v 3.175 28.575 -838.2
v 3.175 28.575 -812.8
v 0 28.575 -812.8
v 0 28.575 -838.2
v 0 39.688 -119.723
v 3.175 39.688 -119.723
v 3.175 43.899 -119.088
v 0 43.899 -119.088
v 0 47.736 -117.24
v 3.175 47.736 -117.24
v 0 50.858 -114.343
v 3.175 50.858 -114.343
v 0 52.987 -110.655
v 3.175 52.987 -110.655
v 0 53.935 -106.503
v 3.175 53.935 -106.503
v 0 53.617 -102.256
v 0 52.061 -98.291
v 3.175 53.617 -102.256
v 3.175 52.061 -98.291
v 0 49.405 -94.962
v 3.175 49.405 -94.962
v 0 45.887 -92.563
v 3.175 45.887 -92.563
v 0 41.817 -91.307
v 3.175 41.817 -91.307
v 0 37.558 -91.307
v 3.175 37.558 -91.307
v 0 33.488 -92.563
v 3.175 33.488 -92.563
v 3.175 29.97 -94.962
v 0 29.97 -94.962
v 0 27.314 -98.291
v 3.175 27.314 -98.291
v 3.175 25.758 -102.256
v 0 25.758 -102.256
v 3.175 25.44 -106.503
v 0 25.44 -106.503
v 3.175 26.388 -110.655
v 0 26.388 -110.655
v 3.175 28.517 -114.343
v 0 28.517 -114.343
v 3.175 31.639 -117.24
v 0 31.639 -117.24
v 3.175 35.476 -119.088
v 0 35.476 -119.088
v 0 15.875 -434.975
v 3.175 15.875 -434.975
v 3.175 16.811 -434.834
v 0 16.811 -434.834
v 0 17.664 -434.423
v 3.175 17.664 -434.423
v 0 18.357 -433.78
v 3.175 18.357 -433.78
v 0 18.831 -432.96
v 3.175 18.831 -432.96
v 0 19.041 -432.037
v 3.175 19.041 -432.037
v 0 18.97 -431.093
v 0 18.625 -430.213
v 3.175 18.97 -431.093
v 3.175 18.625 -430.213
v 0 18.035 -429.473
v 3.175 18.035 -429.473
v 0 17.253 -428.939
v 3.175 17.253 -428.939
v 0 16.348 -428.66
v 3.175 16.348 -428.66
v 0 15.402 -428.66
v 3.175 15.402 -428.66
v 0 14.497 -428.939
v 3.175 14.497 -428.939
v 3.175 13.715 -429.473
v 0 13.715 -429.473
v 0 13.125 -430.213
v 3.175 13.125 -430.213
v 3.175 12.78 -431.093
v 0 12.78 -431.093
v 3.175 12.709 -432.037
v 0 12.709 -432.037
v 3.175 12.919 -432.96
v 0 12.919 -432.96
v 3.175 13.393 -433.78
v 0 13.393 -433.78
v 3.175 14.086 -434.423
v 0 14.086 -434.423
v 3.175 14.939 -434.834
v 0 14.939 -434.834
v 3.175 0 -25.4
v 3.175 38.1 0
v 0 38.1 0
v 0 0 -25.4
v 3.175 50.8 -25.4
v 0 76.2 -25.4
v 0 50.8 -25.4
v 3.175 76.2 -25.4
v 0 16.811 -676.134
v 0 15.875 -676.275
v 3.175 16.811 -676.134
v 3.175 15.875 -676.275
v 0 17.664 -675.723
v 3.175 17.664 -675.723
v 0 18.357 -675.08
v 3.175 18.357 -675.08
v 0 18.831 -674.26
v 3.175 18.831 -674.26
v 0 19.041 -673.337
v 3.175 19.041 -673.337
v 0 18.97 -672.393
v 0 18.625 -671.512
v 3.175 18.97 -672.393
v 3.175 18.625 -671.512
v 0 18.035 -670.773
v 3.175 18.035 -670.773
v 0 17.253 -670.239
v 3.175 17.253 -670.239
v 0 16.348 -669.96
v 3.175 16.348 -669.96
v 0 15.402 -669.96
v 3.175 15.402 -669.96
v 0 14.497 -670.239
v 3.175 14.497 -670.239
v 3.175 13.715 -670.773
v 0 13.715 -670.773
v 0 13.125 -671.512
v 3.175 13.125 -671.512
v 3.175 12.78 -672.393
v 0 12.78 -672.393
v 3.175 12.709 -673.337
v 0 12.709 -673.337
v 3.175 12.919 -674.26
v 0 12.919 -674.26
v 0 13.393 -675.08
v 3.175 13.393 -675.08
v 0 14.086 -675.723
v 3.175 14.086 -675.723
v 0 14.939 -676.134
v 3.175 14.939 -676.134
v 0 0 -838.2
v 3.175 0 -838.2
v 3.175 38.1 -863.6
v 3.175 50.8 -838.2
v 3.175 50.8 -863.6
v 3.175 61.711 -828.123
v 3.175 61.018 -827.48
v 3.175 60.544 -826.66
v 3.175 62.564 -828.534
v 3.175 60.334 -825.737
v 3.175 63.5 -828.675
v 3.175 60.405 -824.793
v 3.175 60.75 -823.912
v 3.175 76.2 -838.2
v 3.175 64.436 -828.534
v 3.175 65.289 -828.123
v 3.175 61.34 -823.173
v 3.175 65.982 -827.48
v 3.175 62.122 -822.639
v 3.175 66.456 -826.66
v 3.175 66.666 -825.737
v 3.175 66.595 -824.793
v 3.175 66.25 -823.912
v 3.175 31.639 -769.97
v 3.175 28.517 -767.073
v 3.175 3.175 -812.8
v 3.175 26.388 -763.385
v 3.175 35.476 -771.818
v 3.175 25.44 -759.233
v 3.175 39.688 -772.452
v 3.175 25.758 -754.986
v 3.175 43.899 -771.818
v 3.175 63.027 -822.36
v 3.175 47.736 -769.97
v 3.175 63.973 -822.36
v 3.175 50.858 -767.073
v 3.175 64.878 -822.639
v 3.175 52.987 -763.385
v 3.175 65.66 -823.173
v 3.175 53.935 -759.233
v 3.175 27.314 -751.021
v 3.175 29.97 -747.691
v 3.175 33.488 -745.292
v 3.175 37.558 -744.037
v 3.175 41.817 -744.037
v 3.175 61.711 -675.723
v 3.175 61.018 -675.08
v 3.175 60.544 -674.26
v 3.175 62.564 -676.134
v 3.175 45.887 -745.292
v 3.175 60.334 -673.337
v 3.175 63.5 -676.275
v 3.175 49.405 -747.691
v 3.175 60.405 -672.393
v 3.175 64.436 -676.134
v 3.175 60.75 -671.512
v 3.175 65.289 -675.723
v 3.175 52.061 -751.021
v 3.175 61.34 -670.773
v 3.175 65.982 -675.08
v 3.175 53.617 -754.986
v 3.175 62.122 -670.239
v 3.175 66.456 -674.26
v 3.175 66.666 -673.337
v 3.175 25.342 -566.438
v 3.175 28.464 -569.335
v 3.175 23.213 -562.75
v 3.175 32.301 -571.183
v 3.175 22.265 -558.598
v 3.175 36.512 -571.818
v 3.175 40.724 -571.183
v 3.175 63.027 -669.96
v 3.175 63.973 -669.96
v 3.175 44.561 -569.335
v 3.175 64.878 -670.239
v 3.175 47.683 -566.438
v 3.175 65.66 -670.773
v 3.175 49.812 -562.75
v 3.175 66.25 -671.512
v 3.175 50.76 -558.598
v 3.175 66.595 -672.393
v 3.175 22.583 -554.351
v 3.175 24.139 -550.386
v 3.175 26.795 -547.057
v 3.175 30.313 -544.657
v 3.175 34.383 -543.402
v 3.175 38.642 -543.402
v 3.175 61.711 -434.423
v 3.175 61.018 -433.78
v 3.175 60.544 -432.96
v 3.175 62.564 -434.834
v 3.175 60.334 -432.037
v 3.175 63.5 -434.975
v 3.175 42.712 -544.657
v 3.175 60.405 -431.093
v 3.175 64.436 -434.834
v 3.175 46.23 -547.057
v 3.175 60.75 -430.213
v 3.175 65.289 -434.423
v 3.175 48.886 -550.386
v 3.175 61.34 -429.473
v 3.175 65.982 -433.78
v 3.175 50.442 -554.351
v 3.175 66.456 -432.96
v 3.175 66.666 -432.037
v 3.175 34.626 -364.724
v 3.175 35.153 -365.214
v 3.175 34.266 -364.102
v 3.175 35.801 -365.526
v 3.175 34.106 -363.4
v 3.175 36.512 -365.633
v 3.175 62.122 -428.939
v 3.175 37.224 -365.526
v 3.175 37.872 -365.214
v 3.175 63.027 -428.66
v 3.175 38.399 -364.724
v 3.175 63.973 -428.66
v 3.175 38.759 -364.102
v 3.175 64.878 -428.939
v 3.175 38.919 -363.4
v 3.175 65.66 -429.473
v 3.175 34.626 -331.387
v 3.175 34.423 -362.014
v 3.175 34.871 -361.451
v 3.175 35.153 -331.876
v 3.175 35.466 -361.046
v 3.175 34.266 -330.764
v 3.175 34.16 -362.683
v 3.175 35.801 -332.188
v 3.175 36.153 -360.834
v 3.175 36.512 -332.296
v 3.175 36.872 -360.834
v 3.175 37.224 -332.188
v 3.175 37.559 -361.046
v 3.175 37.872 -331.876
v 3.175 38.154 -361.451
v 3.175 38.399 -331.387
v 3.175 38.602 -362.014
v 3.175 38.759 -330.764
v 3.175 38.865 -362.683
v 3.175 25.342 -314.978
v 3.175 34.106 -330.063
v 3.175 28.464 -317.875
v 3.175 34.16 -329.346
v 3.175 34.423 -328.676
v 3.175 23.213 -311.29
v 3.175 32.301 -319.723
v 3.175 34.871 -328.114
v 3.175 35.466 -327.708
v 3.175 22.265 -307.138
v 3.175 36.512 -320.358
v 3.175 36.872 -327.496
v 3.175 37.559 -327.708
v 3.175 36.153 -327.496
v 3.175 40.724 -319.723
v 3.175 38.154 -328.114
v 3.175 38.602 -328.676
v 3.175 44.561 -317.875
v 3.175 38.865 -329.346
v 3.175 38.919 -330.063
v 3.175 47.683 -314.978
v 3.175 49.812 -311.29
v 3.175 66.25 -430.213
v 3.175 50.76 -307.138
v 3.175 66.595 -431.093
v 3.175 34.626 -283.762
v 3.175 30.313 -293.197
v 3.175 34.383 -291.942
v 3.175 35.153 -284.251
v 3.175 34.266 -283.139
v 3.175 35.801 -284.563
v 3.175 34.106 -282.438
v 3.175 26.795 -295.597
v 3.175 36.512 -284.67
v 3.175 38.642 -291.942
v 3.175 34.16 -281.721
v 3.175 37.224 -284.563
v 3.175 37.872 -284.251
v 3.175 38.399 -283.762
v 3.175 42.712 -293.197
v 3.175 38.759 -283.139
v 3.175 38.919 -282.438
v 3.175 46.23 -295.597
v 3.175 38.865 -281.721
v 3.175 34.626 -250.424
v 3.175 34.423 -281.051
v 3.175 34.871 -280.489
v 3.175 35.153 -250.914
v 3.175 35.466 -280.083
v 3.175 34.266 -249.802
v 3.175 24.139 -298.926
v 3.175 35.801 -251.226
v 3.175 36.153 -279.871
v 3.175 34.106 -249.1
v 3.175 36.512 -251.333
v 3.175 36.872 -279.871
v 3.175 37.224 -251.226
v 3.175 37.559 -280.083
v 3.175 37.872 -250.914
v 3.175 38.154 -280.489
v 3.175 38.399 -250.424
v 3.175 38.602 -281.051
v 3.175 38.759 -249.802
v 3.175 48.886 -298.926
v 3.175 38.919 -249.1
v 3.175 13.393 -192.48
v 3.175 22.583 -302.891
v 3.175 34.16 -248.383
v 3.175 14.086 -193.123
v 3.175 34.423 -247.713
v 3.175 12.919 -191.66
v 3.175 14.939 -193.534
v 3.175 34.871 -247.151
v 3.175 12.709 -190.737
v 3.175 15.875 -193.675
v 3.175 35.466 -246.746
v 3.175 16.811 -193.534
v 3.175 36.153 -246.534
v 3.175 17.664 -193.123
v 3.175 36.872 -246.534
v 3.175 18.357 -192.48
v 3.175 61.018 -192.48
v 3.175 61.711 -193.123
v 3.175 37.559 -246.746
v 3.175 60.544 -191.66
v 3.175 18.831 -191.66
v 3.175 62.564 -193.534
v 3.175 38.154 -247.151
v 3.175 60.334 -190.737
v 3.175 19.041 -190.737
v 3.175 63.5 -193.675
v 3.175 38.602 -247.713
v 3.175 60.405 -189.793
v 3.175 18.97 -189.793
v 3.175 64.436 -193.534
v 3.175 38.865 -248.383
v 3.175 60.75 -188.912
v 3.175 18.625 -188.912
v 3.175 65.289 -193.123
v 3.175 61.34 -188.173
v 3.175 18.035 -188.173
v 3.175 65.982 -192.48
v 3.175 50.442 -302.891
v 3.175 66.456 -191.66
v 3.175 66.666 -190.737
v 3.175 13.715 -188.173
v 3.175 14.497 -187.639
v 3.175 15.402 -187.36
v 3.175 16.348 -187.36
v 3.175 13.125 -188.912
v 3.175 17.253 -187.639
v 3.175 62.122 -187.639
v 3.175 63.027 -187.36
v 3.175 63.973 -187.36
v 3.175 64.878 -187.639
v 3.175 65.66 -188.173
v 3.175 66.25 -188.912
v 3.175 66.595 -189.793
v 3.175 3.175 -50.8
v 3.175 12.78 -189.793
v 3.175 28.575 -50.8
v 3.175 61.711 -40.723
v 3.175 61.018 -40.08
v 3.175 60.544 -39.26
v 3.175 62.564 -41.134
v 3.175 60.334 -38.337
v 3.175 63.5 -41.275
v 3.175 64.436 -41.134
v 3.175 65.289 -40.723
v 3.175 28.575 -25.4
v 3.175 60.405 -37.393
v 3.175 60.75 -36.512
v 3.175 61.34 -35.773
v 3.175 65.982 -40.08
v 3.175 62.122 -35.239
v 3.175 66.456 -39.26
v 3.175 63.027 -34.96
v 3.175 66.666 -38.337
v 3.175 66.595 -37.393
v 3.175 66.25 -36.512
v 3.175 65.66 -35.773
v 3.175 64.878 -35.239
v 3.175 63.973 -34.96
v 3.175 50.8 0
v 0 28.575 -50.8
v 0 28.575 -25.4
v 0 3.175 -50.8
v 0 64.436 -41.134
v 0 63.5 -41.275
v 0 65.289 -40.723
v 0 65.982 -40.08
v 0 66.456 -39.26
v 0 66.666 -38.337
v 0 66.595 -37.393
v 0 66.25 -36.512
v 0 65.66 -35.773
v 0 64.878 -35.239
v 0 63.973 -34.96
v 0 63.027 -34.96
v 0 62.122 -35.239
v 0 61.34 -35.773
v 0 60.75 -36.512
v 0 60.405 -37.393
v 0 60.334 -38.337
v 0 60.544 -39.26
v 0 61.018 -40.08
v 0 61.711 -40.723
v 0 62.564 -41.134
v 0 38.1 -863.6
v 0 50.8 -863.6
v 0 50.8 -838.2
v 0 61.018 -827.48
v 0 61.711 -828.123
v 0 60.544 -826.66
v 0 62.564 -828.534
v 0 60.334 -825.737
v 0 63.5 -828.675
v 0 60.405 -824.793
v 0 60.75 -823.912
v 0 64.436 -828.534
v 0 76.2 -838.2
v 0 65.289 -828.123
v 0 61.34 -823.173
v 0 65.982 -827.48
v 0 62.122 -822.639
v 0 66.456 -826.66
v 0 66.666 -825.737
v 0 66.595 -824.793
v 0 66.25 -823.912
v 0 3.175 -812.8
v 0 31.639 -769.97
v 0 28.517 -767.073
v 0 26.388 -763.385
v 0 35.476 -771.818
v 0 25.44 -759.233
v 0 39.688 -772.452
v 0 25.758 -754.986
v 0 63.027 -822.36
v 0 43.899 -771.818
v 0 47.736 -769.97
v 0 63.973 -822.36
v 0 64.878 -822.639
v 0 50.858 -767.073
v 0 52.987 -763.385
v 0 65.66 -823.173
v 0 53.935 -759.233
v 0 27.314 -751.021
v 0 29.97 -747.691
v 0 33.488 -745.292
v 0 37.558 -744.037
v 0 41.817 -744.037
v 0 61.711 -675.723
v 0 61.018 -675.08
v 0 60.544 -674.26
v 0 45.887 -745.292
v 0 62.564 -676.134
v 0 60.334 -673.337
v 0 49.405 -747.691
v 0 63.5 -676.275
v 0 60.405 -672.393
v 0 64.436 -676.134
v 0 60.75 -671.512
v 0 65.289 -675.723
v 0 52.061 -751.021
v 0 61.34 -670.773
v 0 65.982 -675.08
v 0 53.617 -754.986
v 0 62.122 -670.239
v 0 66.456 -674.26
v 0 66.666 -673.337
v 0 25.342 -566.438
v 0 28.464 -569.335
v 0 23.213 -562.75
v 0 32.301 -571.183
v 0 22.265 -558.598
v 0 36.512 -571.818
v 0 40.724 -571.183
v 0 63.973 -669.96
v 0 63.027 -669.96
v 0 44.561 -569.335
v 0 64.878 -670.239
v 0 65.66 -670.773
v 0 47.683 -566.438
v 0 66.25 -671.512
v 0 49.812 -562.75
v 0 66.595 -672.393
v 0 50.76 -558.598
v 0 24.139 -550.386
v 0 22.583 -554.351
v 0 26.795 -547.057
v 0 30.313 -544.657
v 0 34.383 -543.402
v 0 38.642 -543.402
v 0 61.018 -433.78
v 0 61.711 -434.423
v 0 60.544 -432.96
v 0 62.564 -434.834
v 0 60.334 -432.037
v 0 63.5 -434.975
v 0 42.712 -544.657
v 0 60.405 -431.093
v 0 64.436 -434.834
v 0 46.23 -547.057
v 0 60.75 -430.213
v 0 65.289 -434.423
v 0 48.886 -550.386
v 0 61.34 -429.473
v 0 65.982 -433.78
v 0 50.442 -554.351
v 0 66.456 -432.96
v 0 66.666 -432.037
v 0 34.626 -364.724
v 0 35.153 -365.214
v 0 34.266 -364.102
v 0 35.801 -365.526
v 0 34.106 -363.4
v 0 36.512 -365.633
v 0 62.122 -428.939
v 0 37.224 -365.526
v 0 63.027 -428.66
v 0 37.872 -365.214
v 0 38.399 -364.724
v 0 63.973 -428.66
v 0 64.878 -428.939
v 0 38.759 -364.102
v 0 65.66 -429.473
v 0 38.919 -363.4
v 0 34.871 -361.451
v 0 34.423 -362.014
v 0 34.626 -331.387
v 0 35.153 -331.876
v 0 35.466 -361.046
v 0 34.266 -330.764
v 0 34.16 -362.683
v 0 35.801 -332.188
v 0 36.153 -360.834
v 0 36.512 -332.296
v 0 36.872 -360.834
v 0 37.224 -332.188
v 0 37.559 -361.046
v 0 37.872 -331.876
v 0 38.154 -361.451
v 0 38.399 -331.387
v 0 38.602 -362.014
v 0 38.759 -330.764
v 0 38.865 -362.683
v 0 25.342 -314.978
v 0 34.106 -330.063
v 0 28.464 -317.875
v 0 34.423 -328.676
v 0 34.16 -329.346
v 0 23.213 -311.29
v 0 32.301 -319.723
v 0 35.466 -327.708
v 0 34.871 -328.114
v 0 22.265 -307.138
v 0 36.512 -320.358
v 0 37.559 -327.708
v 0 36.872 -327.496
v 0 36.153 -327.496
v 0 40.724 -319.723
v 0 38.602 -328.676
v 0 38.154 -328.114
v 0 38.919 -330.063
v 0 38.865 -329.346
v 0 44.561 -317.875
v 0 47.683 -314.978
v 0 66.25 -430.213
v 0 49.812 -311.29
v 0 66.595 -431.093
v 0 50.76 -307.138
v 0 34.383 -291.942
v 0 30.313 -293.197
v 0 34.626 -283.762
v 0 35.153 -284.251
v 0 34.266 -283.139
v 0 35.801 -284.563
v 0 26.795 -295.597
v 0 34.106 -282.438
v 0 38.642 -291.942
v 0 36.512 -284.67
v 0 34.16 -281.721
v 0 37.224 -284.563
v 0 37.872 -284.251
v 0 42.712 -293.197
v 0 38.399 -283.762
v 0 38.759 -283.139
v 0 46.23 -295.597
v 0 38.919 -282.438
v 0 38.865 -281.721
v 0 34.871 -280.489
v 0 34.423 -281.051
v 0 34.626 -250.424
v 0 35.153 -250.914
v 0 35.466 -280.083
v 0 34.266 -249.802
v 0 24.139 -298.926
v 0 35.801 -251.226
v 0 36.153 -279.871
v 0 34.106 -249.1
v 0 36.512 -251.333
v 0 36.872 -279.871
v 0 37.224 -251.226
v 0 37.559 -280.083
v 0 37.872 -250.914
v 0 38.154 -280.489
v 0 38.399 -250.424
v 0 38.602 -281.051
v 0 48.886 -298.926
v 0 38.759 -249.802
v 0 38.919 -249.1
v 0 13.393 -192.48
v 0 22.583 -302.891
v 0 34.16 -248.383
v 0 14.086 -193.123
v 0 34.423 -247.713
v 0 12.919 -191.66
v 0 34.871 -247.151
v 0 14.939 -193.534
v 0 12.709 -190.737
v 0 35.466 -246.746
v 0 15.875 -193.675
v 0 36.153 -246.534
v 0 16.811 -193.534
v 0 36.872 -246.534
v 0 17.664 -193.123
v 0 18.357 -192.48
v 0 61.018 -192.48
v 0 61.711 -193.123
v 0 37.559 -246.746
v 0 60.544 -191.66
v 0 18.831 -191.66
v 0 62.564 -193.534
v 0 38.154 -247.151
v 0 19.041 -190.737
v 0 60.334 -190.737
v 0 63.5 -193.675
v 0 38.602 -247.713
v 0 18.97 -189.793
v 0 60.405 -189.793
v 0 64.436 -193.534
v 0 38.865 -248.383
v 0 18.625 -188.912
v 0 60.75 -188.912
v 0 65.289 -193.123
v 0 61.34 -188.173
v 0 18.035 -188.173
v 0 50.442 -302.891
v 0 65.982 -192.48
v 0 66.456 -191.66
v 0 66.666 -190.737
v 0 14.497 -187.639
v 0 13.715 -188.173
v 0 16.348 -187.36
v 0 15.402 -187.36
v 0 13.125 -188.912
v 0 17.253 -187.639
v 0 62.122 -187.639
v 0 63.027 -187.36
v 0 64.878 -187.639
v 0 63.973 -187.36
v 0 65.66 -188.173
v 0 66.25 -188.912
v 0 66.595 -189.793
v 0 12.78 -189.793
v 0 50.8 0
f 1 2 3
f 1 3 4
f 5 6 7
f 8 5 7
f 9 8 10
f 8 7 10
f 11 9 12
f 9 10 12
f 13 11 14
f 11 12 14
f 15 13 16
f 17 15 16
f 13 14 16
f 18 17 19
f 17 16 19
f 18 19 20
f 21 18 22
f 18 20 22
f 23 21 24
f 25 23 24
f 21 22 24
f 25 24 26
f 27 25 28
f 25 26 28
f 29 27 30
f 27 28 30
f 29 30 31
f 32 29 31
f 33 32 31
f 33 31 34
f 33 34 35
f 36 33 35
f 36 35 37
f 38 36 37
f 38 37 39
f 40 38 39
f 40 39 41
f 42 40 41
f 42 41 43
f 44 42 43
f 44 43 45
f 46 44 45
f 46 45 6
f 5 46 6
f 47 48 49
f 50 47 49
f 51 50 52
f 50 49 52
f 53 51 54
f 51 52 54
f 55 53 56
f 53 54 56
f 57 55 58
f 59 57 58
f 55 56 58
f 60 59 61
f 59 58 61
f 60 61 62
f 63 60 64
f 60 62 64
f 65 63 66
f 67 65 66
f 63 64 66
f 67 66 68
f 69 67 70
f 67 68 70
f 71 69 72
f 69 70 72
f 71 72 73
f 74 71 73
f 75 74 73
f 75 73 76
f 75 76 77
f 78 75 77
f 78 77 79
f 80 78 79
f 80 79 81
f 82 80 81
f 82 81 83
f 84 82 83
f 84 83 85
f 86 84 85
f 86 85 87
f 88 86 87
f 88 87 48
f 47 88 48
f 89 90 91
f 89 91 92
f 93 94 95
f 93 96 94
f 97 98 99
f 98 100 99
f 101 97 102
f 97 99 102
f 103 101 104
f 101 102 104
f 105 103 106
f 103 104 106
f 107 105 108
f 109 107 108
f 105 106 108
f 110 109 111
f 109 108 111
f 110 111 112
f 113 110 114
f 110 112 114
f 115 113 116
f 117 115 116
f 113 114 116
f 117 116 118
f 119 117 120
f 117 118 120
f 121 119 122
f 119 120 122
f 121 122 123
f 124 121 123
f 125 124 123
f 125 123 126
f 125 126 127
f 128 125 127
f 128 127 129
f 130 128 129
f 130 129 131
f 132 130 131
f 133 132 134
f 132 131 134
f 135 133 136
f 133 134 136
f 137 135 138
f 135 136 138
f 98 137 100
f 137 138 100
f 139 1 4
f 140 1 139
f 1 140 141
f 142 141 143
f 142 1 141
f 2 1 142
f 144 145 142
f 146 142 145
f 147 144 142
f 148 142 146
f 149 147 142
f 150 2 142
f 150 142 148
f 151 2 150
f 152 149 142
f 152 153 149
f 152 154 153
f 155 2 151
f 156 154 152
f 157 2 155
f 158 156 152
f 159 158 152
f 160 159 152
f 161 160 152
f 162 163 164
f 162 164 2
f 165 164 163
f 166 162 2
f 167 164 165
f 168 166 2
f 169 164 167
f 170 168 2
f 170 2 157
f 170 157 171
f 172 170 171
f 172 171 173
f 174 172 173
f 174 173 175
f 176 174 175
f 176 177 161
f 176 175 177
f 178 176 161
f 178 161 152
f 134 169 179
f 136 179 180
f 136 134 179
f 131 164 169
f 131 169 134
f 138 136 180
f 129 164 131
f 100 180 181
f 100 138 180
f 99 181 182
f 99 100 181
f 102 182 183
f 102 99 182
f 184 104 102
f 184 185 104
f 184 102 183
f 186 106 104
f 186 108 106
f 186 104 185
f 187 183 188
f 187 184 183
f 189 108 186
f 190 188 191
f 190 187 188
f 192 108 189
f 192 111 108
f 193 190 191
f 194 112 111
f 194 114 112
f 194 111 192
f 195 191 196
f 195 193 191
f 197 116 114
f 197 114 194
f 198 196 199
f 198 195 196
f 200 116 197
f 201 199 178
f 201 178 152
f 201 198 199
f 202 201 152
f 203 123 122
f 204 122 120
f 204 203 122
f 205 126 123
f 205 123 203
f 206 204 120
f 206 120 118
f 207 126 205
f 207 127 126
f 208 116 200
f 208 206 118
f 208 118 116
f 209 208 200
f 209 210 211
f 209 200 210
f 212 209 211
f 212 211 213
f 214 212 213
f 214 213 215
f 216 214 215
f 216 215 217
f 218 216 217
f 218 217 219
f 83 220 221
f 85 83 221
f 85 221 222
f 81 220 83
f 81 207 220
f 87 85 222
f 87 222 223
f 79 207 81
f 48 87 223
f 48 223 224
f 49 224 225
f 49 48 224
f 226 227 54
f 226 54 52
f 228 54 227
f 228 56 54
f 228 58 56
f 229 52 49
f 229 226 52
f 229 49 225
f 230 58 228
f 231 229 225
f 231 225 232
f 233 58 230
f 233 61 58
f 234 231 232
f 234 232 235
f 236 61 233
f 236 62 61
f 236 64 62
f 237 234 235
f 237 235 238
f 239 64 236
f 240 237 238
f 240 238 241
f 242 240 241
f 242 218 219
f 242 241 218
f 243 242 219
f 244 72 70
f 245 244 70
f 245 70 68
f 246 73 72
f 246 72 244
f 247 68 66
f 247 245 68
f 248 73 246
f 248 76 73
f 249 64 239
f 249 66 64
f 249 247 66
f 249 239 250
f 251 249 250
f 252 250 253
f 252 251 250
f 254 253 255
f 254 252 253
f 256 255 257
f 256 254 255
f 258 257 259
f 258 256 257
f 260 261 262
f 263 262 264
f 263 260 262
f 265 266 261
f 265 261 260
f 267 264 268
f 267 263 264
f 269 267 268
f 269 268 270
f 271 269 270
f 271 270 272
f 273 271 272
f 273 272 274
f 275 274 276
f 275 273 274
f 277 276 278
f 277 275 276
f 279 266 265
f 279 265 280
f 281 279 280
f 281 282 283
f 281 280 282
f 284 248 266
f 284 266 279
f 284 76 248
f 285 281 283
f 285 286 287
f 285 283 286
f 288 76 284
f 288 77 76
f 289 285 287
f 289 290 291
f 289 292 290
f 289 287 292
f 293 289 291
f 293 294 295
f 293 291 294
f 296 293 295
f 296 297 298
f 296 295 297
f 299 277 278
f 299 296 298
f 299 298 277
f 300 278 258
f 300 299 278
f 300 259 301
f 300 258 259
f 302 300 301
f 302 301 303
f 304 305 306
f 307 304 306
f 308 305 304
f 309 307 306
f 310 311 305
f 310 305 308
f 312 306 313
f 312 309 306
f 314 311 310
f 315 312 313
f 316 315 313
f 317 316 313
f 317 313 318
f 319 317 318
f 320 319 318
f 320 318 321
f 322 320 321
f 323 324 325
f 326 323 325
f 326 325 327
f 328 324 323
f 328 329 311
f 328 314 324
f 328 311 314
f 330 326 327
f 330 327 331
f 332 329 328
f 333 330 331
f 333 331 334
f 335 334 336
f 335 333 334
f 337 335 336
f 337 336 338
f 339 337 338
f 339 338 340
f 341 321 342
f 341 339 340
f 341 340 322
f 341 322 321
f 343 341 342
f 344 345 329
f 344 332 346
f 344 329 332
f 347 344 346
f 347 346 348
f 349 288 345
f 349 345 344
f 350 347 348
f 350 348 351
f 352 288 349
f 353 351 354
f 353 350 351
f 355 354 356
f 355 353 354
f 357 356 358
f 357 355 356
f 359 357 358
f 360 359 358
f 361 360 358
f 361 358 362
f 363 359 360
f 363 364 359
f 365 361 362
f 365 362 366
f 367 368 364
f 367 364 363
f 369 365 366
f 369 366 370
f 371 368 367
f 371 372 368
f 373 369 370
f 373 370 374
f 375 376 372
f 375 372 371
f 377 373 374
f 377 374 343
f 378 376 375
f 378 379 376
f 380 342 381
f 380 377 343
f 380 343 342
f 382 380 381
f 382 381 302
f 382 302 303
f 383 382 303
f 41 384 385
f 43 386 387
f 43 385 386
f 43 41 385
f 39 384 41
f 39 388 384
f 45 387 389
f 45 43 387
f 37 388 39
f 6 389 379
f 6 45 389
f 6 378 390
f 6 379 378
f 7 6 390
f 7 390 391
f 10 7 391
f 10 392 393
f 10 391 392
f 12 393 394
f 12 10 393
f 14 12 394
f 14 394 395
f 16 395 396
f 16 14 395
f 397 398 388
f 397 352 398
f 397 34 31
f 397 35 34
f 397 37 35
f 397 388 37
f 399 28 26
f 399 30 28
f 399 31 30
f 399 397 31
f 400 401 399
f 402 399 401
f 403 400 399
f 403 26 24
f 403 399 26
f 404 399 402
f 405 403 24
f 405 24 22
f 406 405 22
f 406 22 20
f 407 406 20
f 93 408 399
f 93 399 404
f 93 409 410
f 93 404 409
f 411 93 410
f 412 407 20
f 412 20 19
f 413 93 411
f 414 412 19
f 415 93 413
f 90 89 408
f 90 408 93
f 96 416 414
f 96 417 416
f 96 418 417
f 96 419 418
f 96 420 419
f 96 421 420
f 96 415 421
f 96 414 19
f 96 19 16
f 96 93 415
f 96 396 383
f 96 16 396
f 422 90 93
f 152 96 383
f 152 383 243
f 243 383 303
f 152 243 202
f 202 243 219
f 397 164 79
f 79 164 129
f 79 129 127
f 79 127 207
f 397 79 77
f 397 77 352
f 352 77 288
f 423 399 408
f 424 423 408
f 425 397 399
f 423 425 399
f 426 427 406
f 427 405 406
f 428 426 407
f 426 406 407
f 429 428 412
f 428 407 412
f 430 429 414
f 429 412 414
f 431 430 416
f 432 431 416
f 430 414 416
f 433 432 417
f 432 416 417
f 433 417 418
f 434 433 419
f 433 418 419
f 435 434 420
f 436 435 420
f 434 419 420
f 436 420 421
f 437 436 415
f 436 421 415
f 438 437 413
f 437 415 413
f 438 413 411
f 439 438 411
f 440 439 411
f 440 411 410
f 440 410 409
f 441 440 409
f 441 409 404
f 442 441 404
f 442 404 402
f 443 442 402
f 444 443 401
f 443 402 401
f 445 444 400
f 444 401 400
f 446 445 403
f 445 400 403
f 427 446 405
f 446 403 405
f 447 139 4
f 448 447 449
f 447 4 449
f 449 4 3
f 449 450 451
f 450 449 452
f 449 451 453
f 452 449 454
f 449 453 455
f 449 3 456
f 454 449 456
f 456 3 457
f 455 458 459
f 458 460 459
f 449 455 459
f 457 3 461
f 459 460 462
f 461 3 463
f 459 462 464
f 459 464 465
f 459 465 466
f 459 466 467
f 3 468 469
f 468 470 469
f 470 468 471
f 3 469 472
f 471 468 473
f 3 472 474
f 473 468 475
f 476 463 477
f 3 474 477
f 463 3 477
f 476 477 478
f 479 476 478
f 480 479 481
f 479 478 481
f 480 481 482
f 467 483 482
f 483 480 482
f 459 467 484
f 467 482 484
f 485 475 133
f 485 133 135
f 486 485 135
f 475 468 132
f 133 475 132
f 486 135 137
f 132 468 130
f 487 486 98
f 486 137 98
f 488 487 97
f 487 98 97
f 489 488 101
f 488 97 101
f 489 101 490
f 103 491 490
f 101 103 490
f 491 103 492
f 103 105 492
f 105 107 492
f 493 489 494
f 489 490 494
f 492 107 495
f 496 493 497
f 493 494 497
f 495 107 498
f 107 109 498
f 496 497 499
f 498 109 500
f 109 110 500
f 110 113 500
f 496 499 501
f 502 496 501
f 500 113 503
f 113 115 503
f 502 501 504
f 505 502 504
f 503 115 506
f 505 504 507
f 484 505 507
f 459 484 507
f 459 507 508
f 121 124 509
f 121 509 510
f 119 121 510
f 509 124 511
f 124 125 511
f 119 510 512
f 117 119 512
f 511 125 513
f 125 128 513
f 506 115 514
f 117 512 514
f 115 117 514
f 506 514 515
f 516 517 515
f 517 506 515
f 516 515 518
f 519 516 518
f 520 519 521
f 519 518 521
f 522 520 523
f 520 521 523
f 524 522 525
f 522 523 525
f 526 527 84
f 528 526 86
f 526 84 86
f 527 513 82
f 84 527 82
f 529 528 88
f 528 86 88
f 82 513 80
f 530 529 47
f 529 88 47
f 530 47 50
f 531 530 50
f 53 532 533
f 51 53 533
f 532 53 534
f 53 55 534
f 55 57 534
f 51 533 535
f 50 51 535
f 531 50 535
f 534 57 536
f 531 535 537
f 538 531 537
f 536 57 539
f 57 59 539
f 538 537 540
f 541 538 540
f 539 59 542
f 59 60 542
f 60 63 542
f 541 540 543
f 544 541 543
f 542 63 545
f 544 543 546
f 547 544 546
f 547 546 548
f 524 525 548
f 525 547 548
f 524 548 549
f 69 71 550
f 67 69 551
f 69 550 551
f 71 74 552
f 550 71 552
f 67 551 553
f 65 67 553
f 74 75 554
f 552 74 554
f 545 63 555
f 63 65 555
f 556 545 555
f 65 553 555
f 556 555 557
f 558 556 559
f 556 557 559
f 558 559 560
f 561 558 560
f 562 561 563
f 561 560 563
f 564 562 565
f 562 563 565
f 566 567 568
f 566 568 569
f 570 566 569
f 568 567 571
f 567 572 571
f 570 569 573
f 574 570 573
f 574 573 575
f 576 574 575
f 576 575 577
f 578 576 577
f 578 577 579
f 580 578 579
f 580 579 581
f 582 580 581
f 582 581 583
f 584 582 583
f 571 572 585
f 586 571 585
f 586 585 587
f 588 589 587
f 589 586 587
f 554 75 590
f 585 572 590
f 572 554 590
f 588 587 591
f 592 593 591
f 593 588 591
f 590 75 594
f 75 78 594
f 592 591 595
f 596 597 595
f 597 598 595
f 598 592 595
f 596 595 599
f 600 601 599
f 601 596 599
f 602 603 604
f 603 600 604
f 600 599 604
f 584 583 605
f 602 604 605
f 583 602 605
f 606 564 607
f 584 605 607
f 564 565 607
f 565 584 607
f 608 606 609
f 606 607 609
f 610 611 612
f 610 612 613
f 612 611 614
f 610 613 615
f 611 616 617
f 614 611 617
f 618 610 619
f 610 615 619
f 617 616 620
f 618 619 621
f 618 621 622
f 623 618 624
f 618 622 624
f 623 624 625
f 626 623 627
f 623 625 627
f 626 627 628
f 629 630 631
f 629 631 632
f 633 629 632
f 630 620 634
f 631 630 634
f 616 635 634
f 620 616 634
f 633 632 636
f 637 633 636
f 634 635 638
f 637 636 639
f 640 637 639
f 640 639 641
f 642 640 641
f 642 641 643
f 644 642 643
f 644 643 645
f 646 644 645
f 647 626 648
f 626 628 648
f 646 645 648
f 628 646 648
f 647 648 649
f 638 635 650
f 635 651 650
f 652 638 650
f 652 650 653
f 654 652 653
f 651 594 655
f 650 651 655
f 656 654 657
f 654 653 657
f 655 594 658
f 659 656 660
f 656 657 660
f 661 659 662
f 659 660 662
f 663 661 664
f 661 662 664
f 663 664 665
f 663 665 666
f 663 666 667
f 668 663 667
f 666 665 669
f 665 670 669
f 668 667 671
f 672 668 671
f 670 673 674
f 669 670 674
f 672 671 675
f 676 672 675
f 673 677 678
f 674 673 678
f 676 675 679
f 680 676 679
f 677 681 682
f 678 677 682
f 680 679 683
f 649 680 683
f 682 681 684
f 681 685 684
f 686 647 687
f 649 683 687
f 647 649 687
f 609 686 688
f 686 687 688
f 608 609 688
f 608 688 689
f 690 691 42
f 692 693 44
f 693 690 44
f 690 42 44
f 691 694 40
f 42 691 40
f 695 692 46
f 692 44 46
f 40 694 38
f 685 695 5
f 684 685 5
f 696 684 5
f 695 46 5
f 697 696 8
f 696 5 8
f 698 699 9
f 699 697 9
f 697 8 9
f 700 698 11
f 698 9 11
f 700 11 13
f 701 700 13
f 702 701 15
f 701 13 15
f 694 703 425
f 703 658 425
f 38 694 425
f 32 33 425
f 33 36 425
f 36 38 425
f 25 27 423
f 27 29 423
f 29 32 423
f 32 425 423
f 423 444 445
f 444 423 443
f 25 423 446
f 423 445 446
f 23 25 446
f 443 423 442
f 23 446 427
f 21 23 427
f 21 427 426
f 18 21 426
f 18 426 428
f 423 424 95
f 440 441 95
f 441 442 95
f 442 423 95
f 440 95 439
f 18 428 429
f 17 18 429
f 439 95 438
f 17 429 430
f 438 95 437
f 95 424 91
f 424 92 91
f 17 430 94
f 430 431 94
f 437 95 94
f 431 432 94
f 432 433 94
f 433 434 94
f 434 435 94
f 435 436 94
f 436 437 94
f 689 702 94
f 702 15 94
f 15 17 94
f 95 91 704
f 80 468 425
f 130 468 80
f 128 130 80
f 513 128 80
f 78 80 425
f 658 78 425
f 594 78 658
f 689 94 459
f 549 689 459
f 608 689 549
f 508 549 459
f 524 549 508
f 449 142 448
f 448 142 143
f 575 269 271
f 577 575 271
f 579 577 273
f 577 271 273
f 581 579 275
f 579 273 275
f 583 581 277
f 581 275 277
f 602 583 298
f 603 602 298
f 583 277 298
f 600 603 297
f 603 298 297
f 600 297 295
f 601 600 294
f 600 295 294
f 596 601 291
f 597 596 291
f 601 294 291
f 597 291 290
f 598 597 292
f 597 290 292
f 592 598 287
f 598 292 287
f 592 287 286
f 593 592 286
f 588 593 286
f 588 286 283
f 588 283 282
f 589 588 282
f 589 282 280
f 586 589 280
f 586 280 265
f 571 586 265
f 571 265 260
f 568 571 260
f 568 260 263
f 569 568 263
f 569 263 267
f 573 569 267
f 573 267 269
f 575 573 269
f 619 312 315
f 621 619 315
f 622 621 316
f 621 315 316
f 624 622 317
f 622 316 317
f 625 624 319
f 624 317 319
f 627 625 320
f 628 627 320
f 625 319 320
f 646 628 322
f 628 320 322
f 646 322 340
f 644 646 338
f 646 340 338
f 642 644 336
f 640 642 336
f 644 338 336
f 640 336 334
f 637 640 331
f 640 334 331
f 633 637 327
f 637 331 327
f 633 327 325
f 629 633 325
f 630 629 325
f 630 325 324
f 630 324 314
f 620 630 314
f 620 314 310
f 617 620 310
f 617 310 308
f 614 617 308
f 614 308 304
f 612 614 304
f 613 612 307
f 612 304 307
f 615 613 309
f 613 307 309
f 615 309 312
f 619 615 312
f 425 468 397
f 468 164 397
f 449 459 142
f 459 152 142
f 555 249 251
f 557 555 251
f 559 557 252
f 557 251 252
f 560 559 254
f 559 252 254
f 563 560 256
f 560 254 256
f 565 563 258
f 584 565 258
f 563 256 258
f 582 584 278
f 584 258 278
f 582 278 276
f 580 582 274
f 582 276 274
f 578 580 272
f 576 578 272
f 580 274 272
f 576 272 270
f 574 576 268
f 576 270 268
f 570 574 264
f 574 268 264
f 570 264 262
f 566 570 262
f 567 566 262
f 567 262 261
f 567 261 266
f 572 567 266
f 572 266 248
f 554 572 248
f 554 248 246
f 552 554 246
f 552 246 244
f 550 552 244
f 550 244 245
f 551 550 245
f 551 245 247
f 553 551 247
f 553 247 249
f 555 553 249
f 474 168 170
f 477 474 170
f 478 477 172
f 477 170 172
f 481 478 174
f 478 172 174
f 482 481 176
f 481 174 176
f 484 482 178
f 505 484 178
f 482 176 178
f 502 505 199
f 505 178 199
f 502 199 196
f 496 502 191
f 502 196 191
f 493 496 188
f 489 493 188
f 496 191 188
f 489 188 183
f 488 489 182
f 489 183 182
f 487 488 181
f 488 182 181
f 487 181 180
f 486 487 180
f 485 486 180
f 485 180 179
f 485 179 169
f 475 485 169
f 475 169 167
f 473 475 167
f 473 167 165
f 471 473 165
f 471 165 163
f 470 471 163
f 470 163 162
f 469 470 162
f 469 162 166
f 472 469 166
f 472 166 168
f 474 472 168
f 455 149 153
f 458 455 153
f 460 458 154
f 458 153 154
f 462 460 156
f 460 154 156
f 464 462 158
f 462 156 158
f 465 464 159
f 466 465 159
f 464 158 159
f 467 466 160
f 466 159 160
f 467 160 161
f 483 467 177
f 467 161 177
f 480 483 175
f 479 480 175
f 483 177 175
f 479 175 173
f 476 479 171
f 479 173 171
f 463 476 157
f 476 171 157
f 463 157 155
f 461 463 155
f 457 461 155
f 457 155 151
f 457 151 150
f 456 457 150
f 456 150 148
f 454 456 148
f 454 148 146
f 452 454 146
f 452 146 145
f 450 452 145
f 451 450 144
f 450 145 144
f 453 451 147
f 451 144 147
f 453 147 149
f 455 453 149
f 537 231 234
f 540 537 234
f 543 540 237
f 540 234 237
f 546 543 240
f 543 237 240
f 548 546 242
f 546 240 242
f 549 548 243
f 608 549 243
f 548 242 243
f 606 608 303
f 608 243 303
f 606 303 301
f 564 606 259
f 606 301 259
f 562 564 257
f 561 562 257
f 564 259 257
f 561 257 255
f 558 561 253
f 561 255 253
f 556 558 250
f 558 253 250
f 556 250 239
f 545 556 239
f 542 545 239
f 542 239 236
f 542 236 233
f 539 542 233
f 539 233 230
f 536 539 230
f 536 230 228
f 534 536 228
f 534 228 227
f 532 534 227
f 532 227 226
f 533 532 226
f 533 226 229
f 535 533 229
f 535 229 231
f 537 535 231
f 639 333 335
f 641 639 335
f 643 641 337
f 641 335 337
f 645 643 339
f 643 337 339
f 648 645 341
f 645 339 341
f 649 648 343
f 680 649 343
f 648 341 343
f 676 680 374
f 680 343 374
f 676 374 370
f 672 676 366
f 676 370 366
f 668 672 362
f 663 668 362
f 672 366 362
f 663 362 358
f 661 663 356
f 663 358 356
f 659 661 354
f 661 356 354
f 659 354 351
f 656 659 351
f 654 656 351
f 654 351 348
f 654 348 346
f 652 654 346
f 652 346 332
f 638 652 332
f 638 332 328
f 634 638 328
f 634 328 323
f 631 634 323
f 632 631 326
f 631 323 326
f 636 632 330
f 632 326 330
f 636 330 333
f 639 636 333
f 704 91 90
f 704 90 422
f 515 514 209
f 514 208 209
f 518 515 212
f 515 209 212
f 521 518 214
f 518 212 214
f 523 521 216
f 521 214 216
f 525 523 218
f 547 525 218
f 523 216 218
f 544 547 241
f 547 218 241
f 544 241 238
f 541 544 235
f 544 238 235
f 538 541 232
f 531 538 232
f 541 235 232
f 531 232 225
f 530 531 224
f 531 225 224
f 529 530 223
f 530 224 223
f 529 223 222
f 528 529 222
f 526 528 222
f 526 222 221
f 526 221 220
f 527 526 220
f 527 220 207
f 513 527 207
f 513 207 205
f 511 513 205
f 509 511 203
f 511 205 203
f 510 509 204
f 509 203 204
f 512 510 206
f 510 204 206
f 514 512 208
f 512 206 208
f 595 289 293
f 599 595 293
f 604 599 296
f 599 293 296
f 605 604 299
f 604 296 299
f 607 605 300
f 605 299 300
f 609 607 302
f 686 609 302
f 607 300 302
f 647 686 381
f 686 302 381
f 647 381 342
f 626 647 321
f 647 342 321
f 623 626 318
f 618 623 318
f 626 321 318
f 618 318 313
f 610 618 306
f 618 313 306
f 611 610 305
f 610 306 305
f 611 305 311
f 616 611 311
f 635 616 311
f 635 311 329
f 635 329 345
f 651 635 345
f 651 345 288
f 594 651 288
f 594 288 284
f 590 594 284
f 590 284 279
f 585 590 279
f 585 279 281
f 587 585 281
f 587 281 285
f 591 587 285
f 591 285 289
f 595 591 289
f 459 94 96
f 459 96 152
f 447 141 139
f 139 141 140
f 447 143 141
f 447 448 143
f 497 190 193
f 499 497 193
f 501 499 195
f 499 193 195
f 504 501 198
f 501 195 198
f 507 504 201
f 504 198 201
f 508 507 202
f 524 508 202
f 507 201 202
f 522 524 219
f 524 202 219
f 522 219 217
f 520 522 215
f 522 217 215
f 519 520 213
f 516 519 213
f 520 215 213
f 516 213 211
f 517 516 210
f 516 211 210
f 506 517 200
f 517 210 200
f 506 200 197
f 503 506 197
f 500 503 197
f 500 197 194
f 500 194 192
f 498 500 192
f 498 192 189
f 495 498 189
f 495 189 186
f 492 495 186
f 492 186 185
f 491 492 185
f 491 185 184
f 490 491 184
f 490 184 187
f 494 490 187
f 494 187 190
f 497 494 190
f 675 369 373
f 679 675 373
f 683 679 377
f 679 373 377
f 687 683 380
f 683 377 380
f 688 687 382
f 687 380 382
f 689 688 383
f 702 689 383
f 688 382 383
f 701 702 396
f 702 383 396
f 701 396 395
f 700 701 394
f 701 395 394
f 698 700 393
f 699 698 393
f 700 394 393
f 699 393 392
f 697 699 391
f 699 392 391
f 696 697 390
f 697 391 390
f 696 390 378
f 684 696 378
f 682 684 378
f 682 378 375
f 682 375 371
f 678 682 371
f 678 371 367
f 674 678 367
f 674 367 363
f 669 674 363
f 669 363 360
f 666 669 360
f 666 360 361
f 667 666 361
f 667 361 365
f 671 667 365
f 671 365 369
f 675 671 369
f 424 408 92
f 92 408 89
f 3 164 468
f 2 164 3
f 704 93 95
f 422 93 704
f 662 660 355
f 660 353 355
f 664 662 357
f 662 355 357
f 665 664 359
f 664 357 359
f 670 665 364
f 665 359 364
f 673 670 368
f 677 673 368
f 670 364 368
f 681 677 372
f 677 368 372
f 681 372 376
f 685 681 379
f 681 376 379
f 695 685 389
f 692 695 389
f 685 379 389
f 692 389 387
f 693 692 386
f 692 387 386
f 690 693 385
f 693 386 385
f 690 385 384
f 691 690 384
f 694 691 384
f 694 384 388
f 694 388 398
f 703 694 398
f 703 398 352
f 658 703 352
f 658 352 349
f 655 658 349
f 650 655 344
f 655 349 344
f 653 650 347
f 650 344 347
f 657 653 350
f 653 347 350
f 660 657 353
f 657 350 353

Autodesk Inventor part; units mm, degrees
ref_plane "YZ Plane" through (0, 0, 0) normal (1, 0, 0) x (0, 1, 0)
ref_plane "XZ Plane" through (0, 0, 0) normal (0, 1, 0) x (-1, 0, 0)
ref_plane "XY Plane" through (0, 0, 0) normal (0, 0, 1) x (1, 0, 0)
sketch "Sketch1" plane through (0, 0, 0) normal (1, 0, 0) x (0, 1, 0)
  line L0 (0, 0) -> (76.2, 0)
  line L1 (76.2, 0) -> (76.2, -863.6)
  line L2 (76.2, -863.6) -> (0, -863.6)
  line L3 (0, -863.6) -> (0, 0)
  dimension "d0" = 76.2
  dimension "d1" = 863.6
extrude "Extrusion1" add sketch "Sketch1" along normal blind 3.175
sketch "Sketch2" plane through (3.175, 0, 0) normal (1, 0, 0) x (0, 0, -1)
  line L0 (0, 38.1) -> (0, 36.5125)
  line L1 (0, 36.5125) -> (0, 39.6875)
  circle A0 centre (306.07, 36.5125) radius 14.2875
  circle A1 centre (557.53, 36.5125) radius 14.2875
  circle A2 centre (105.4351, 39.6875) radius 14.2875
  circle A3 centre (758.1649, 39.6875) radius 14.2875
  line L2 (863.6, 0) -> (838.2, 0)
  line L3 (863.6, 0) -> (863.6, 38.1)
  line L4 (863.6, 38.1) -> (838.2, 0)
  circle A4 centre (12.7, 63.5) radius 3.175
  line L5 (863.6, 76.2) -> (0, 76.2) projected
  circle A5 centre (850.9, 63.5) radius 3.175
  circle A6 centre (825.5, 15.875) radius 3.175
  circle A7 centre (38.1, 15.875) radius 3.175
  circle A8 centre (190.5, 15.875) radius 3.175
  circle A9 centre (431.8, 15.875) radius 3.175
  circle A10 centre (431.8, 63.5) radius 3.175
  circle A11 centre (673.1, 63.5) radius 3.175
  circle A12 centre (673.1, 15.875) radius 3.175
  circle A13 centre (190.5, 63.5) radius 3.175
  line L6 (0, 0) -> (25.4, 0)
  line L7 (0, 0) -> (0, 38.1)
  line L8 (0, 38.1) -> (25.4, 0)
  line L9 (863.6, 0) -> (0, 0) projected
  dimension "d15" = 28.575
  dimension "d16" = 28.575
  dimension "d19" = 28.575
  dimension "d21" = 28.575
  dimension "d22" = 25.4
  dimension "d26" = 6.35
  dimension "d27" = 12.7
  dimension "d29" = 6.35
  dimension "d30" = 12.7
  dimension "d32" = 6.35
  dimension "d34" = 12.7
  dimension "d35" = 6.35
  dimension "d39" = 6.35
  dimension "d40" = 863.6
  dimension "d41" = 6.35
  dimension "d43" = 6.35
  dimension "d44" = 12.7
  dimension "d45" = 6.35
  dimension "d46" = 6.35
  dimension "d48" = 241.3
  dimension "d49" = 241.3
  dimension "d50" = 6.35
  dimension "d51" = 241.3
  dimension "d53" = 241.3
  dimension "d54" = 25.4
  dimension "d55" = 38.1
  dimension "d58" = 15.875
  dimension "d59" = 15.875
  dimension "d60" = 15.875
extrude "Extrusion3" cut sketch "Sketch2" against normal blind 25.4
sketch "Sketch3" plane through (3.175, 0, 0) normal (1, 0, 0) x (0, 0, -1)
  line L0 (0, 76.2) -> (863.6, 76.2) projected
  line L1 (0, 76.2) -> (25.4, 76.2)
  line L2 (25.4, 76.2) -> (25.4, 50.8)
  line L3 (25.4, 50.8) -> (0, 50.8)
  line L4 (0, 50.8) -> (0, 76.2)
  line L5 (25.4, 0) -> (50.8, 0)
  line L6 (50.8, 0) -> (50.8, 28.575)
  line L7 (50.8, 28.575) -> (25.4, 28.575)
  line L8 (25.4, 28.575) -> (25.4, 0)
  line L9 (863.6, 76.2) -> (838.2, 76.2)
  line L10 (838.2, 76.2) -> (838.2, 50.8)
  line L11 (838.2, 50.8) -> (863.6, 50.8)
  line L12 (863.6, 50.8) -> (863.6, 76.2)
  line L13 (50.8, 0) -> (812.8, 0)
  line L14 (812.8, 0) -> (812.8, 3.175)
  line L15 (812.8, 3.175) -> (50.8, 3.175)
  line L16 (50.8, 3.175) -> (50.8, 0)
  line L17 (838.2, 0) -> (812.8, 0)
  line L18 (812.8, 0) -> (812.8, 28.575)
  line L19 (812.8, 28.575) -> (838.2, 28.575)
  line L20 (838.2, 28.575) -> (838.2, 0)
  circle A0 centre (38.1, 63.5) radius 3.175
  circle A1 centre (825.5, 63.5) radius 3.175
  circle A2 centre (306.07, 36.5125) radius 14.2875 projected
  circle A3 centre (329.8825, 36.5125) radius 2.413
  circle A4 centre (363.22, 36.5125) radius 2.413
  circle A5 centre (282.2575, 36.5125) radius 2.413
  circle A6 centre (248.92, 36.5125) radius 2.413
  point P0 (0, 0)
  dimension "d63" = 25.4
  dimension "d64" = 25.4
  dimension "d65" = 25.4
  dimension "d66" = 28.575
  dimension "d67" = 25.4
  dimension "d68" = 25.4
  dimension "d77" = 762
  dimension "d78" = 3.175
  dimension "d79" = 25.4
  dimension "d80" = 28.575
  dimension "d81" = 6.35
  dimension "d82" = 6.35
  dimension "d88" = 4.826
  dimension "d89" = 4.826
  dimension "d90" = 4.826
  dimension "d91" = 4.826
extrude "Extrusion5" cut sketch "Sketch3" against normal blind 25.4 contours L0 L12 L11 L10 | L0 L2 L3 L4 | L8 L7 L6 L5 | L6 L15 L14 L13 | L14 L18 L19 L20 L17 | A0 | A1 | A3 | A4 | A5 | A6
properties part number "InsidePlate"
